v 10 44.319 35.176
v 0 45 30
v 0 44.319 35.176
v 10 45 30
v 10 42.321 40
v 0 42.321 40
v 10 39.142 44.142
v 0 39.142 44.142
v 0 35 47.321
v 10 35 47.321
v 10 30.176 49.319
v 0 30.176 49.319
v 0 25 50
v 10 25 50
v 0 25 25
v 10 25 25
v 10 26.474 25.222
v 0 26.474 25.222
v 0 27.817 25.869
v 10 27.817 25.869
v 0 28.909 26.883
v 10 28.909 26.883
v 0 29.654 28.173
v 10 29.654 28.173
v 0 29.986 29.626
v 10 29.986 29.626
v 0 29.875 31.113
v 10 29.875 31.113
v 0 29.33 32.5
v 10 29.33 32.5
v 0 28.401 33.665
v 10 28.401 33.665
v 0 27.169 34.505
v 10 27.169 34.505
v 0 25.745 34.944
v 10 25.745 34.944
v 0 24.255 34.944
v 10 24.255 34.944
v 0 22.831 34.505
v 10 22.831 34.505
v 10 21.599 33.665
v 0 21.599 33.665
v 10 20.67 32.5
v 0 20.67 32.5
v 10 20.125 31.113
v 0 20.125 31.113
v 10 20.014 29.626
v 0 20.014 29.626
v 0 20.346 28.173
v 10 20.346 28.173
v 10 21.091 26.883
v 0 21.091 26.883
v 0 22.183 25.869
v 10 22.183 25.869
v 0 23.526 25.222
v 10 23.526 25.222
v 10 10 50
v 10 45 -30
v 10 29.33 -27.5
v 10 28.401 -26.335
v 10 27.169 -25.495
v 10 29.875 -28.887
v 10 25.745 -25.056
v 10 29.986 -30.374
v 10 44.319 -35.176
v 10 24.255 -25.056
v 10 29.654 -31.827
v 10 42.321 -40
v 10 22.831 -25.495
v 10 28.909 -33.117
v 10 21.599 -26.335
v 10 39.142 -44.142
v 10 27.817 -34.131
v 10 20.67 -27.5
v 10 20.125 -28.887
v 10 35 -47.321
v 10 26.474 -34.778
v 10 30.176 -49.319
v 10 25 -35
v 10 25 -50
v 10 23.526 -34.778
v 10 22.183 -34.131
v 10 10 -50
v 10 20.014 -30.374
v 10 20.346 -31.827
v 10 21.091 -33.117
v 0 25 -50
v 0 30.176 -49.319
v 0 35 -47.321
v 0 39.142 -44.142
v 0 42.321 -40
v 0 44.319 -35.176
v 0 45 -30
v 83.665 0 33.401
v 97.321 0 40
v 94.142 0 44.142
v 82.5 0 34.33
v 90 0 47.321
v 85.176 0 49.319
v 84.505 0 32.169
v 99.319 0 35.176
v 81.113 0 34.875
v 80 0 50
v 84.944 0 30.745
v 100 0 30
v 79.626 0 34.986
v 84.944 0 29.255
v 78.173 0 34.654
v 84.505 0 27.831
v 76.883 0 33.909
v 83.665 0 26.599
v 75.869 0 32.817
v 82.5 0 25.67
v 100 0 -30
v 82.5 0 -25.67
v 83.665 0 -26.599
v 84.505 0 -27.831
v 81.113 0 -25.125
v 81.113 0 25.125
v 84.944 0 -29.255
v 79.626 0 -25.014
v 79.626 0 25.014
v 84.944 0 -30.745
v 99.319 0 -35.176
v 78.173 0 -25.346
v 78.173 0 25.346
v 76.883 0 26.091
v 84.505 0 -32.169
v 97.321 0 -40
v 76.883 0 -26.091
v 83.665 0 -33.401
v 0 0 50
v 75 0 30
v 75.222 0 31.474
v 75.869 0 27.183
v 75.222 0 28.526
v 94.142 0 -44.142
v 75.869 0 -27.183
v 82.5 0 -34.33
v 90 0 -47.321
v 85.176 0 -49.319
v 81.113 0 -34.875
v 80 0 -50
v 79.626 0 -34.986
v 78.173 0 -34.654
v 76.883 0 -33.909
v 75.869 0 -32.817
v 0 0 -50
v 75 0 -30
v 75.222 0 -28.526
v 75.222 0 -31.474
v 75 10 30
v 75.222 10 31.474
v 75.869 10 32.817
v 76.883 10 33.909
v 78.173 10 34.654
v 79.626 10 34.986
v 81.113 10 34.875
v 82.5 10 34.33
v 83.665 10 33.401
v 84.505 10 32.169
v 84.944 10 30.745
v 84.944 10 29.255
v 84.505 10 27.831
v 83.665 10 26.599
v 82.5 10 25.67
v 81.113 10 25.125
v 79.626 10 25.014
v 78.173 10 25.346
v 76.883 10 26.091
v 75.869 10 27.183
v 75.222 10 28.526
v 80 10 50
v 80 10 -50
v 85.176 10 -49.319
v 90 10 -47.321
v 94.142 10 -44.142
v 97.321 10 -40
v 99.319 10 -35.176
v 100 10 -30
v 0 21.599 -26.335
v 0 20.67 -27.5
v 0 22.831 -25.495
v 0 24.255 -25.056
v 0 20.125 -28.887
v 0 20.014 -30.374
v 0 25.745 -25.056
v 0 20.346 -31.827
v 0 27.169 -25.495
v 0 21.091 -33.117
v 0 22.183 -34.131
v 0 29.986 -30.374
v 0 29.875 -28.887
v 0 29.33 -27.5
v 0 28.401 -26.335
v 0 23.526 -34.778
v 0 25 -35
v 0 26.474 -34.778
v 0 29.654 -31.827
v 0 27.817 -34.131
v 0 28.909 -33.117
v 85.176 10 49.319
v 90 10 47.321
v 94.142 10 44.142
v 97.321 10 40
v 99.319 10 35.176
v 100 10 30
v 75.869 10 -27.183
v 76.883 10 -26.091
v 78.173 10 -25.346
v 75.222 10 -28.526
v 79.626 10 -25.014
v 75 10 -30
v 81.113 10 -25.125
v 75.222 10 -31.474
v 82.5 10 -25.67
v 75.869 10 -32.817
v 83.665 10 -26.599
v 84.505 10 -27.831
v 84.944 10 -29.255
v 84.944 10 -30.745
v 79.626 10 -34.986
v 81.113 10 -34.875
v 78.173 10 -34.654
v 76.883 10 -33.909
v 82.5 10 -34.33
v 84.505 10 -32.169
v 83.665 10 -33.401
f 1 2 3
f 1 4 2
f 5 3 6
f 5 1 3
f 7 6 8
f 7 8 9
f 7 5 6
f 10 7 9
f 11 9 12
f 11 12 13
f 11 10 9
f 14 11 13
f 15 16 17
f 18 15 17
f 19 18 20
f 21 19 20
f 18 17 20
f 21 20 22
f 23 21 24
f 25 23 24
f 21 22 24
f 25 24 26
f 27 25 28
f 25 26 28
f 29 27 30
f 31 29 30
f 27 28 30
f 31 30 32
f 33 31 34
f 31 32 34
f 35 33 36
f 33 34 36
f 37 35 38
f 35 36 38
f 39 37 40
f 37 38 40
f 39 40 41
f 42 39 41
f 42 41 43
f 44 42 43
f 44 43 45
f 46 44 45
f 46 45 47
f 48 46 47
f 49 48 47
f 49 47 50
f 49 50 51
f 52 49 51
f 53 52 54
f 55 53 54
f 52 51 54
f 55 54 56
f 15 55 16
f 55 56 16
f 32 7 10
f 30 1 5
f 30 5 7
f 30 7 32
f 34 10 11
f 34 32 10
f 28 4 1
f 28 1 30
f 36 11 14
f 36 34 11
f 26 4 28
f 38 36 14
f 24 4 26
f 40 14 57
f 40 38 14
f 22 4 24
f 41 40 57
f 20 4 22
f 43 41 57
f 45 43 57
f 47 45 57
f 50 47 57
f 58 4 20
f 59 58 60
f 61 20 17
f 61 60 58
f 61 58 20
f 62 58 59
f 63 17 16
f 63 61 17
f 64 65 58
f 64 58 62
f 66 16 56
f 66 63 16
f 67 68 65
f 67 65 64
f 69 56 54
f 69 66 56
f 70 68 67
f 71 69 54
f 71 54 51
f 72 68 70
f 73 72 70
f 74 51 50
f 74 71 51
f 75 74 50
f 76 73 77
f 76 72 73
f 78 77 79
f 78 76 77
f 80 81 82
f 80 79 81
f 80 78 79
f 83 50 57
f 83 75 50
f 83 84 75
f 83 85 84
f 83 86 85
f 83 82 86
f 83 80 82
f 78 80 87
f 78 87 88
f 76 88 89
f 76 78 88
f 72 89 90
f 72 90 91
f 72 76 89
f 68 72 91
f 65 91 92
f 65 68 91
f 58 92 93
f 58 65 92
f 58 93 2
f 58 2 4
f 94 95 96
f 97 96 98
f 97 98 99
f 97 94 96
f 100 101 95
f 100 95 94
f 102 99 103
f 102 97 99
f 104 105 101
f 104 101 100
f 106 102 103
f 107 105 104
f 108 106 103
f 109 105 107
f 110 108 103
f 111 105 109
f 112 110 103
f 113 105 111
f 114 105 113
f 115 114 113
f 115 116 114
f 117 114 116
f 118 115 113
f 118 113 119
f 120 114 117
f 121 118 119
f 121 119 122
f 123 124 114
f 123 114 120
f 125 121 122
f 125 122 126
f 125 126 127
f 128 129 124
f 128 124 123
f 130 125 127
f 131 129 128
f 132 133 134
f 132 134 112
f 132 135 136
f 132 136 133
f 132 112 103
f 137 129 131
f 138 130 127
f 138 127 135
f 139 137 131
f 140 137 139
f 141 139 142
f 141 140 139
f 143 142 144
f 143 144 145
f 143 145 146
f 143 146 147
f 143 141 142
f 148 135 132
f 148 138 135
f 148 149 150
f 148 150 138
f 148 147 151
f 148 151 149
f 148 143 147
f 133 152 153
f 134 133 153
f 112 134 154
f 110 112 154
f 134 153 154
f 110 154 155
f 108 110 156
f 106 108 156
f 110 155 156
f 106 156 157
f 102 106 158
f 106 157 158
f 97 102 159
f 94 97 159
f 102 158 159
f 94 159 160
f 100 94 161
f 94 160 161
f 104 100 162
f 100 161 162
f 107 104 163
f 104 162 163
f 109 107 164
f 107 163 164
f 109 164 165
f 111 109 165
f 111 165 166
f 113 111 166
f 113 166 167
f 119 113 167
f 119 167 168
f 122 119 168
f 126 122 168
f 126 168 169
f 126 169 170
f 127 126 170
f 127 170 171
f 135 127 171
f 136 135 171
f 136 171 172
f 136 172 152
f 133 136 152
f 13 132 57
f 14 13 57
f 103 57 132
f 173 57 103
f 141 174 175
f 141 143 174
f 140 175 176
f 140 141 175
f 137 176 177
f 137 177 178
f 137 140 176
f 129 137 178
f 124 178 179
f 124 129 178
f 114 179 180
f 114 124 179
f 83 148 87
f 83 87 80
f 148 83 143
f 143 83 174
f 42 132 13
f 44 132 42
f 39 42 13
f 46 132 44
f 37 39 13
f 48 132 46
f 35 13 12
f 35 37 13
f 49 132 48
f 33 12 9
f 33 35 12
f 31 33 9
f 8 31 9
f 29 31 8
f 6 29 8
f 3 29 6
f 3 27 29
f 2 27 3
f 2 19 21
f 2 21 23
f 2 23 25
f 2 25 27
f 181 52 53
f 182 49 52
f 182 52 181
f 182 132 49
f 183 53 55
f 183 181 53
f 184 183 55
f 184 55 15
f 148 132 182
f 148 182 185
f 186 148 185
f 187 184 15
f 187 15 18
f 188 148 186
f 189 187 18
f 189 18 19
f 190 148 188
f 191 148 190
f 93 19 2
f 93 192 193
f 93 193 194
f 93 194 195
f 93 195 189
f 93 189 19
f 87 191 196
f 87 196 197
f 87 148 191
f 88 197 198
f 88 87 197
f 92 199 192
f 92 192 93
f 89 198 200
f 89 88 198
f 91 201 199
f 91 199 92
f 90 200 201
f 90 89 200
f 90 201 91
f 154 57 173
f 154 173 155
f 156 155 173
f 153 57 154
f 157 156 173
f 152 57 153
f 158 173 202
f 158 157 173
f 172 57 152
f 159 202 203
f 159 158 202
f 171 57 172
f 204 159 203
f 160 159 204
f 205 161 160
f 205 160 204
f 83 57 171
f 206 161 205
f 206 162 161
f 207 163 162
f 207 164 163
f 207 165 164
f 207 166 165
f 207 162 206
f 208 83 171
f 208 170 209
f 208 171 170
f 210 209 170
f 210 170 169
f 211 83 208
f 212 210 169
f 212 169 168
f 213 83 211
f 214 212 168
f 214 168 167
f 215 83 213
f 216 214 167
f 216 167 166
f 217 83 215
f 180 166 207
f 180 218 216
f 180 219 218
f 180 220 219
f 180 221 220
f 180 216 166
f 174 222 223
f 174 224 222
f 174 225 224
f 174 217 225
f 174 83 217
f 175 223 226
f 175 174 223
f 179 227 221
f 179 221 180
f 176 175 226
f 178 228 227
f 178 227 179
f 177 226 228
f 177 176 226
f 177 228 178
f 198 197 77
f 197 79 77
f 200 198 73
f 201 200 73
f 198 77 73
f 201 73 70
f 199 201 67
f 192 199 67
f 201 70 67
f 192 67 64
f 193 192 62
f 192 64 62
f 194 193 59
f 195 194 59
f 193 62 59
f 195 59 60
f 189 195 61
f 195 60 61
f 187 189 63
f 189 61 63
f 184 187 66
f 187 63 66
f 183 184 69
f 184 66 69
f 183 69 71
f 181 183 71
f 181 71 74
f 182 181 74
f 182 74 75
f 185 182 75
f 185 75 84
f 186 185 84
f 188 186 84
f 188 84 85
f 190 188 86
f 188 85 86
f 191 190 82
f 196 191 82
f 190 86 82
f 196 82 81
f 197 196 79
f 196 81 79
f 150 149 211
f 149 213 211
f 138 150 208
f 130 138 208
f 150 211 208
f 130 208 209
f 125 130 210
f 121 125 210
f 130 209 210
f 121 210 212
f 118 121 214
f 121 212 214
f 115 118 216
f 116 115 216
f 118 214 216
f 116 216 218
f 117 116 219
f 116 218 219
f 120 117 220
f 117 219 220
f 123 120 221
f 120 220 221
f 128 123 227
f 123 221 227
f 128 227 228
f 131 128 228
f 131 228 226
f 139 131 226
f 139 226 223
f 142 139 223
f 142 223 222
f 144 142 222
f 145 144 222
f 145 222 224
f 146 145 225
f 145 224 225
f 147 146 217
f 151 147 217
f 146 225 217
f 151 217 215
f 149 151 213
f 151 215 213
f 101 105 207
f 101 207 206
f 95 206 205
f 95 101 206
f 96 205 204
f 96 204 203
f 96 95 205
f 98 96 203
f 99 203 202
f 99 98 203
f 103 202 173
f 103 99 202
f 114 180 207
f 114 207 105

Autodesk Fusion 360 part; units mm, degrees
sketch "Sketch1" plane through (0, 0, 0) normal (0, 0, 1) x (1, 0, 0)
  line L0 (0, 0) -> (0, 45)
  line L1 (0, 45) -> (10, 45)
  line L2 (10, 45) -> (10, 10)
  line L3 (10, 10) -> (100, 10)
  line L4 (100, 10) -> (100, 0)
  line L5 (100, 0) -> (0, 0)
  dimension "d1" = 10
  dimension "d2" = 100
  dimension "d3" = 45
extrude "Extrude1" add sketch "Sketch1" along normal mid plane 100
fillet "Fillet1" radius 20 4 edges at (5, 45, 50) (5, 45, -50) (100, 5, -50) (100, 5, 50)
sketch "Sketch2" plane through (10, 0, 0) normal (1, 0, 0) x (0, 0, -1)
  arc A0 (50, 25) -> (30, 45) centre (30, 25) ccw
  line L0 (30, 45) -> (-30, 45)
  arc A1 (-30, 45) -> (-50, 25) centre (-30, 25) ccw
  line L1 (-50, 25) -> (-50, 10)
  line L2 (-50, 10) -> (50, 10)
  line L3 (50, 10) -> (50, 25)
  circle A2 centre (-30, 25) radius 10
  circle A3 centre (30, 25) radius 10
  dimension "d7" = 20
extrude "Extrude2" cut sketch "Sketch2" against normal through all contours A2 | A3
sketch "Sketch3" plane through (0, 10, 0) normal (0, 1, 0) x (-1, 0, 0)
  arc A0 (-80, 50) -> (-100, 30) centre (-80, 30) ccw
  line L0 (-100, 30) -> (-100, -30)
  arc A1 (-100, -30) -> (-80, -50) centre (-80, -30) ccw
  line L1 (-80, -50) -> (-10, -50)
  line L2 (-10, -50) -> (-10, 50)
  line L3 (-10, 50) -> (-80, 50)
  circle A2 centre (-80, -30) radius 10
  circle A3 centre (-80, 30) radius 10
  dimension "d9" = 20
extrude "Extrude3" cut sketch "Sketch3" against normal through all contours A2 | A3
move_face "OffsetFaces1" offset 5 4 faces at (6.6667, 24.0043, 20.0497) (6.6667, 24.0043, -39.9503) (70.0497, 6.6667, -30.9957) (70.0497, 6.6667, 29.0043)
